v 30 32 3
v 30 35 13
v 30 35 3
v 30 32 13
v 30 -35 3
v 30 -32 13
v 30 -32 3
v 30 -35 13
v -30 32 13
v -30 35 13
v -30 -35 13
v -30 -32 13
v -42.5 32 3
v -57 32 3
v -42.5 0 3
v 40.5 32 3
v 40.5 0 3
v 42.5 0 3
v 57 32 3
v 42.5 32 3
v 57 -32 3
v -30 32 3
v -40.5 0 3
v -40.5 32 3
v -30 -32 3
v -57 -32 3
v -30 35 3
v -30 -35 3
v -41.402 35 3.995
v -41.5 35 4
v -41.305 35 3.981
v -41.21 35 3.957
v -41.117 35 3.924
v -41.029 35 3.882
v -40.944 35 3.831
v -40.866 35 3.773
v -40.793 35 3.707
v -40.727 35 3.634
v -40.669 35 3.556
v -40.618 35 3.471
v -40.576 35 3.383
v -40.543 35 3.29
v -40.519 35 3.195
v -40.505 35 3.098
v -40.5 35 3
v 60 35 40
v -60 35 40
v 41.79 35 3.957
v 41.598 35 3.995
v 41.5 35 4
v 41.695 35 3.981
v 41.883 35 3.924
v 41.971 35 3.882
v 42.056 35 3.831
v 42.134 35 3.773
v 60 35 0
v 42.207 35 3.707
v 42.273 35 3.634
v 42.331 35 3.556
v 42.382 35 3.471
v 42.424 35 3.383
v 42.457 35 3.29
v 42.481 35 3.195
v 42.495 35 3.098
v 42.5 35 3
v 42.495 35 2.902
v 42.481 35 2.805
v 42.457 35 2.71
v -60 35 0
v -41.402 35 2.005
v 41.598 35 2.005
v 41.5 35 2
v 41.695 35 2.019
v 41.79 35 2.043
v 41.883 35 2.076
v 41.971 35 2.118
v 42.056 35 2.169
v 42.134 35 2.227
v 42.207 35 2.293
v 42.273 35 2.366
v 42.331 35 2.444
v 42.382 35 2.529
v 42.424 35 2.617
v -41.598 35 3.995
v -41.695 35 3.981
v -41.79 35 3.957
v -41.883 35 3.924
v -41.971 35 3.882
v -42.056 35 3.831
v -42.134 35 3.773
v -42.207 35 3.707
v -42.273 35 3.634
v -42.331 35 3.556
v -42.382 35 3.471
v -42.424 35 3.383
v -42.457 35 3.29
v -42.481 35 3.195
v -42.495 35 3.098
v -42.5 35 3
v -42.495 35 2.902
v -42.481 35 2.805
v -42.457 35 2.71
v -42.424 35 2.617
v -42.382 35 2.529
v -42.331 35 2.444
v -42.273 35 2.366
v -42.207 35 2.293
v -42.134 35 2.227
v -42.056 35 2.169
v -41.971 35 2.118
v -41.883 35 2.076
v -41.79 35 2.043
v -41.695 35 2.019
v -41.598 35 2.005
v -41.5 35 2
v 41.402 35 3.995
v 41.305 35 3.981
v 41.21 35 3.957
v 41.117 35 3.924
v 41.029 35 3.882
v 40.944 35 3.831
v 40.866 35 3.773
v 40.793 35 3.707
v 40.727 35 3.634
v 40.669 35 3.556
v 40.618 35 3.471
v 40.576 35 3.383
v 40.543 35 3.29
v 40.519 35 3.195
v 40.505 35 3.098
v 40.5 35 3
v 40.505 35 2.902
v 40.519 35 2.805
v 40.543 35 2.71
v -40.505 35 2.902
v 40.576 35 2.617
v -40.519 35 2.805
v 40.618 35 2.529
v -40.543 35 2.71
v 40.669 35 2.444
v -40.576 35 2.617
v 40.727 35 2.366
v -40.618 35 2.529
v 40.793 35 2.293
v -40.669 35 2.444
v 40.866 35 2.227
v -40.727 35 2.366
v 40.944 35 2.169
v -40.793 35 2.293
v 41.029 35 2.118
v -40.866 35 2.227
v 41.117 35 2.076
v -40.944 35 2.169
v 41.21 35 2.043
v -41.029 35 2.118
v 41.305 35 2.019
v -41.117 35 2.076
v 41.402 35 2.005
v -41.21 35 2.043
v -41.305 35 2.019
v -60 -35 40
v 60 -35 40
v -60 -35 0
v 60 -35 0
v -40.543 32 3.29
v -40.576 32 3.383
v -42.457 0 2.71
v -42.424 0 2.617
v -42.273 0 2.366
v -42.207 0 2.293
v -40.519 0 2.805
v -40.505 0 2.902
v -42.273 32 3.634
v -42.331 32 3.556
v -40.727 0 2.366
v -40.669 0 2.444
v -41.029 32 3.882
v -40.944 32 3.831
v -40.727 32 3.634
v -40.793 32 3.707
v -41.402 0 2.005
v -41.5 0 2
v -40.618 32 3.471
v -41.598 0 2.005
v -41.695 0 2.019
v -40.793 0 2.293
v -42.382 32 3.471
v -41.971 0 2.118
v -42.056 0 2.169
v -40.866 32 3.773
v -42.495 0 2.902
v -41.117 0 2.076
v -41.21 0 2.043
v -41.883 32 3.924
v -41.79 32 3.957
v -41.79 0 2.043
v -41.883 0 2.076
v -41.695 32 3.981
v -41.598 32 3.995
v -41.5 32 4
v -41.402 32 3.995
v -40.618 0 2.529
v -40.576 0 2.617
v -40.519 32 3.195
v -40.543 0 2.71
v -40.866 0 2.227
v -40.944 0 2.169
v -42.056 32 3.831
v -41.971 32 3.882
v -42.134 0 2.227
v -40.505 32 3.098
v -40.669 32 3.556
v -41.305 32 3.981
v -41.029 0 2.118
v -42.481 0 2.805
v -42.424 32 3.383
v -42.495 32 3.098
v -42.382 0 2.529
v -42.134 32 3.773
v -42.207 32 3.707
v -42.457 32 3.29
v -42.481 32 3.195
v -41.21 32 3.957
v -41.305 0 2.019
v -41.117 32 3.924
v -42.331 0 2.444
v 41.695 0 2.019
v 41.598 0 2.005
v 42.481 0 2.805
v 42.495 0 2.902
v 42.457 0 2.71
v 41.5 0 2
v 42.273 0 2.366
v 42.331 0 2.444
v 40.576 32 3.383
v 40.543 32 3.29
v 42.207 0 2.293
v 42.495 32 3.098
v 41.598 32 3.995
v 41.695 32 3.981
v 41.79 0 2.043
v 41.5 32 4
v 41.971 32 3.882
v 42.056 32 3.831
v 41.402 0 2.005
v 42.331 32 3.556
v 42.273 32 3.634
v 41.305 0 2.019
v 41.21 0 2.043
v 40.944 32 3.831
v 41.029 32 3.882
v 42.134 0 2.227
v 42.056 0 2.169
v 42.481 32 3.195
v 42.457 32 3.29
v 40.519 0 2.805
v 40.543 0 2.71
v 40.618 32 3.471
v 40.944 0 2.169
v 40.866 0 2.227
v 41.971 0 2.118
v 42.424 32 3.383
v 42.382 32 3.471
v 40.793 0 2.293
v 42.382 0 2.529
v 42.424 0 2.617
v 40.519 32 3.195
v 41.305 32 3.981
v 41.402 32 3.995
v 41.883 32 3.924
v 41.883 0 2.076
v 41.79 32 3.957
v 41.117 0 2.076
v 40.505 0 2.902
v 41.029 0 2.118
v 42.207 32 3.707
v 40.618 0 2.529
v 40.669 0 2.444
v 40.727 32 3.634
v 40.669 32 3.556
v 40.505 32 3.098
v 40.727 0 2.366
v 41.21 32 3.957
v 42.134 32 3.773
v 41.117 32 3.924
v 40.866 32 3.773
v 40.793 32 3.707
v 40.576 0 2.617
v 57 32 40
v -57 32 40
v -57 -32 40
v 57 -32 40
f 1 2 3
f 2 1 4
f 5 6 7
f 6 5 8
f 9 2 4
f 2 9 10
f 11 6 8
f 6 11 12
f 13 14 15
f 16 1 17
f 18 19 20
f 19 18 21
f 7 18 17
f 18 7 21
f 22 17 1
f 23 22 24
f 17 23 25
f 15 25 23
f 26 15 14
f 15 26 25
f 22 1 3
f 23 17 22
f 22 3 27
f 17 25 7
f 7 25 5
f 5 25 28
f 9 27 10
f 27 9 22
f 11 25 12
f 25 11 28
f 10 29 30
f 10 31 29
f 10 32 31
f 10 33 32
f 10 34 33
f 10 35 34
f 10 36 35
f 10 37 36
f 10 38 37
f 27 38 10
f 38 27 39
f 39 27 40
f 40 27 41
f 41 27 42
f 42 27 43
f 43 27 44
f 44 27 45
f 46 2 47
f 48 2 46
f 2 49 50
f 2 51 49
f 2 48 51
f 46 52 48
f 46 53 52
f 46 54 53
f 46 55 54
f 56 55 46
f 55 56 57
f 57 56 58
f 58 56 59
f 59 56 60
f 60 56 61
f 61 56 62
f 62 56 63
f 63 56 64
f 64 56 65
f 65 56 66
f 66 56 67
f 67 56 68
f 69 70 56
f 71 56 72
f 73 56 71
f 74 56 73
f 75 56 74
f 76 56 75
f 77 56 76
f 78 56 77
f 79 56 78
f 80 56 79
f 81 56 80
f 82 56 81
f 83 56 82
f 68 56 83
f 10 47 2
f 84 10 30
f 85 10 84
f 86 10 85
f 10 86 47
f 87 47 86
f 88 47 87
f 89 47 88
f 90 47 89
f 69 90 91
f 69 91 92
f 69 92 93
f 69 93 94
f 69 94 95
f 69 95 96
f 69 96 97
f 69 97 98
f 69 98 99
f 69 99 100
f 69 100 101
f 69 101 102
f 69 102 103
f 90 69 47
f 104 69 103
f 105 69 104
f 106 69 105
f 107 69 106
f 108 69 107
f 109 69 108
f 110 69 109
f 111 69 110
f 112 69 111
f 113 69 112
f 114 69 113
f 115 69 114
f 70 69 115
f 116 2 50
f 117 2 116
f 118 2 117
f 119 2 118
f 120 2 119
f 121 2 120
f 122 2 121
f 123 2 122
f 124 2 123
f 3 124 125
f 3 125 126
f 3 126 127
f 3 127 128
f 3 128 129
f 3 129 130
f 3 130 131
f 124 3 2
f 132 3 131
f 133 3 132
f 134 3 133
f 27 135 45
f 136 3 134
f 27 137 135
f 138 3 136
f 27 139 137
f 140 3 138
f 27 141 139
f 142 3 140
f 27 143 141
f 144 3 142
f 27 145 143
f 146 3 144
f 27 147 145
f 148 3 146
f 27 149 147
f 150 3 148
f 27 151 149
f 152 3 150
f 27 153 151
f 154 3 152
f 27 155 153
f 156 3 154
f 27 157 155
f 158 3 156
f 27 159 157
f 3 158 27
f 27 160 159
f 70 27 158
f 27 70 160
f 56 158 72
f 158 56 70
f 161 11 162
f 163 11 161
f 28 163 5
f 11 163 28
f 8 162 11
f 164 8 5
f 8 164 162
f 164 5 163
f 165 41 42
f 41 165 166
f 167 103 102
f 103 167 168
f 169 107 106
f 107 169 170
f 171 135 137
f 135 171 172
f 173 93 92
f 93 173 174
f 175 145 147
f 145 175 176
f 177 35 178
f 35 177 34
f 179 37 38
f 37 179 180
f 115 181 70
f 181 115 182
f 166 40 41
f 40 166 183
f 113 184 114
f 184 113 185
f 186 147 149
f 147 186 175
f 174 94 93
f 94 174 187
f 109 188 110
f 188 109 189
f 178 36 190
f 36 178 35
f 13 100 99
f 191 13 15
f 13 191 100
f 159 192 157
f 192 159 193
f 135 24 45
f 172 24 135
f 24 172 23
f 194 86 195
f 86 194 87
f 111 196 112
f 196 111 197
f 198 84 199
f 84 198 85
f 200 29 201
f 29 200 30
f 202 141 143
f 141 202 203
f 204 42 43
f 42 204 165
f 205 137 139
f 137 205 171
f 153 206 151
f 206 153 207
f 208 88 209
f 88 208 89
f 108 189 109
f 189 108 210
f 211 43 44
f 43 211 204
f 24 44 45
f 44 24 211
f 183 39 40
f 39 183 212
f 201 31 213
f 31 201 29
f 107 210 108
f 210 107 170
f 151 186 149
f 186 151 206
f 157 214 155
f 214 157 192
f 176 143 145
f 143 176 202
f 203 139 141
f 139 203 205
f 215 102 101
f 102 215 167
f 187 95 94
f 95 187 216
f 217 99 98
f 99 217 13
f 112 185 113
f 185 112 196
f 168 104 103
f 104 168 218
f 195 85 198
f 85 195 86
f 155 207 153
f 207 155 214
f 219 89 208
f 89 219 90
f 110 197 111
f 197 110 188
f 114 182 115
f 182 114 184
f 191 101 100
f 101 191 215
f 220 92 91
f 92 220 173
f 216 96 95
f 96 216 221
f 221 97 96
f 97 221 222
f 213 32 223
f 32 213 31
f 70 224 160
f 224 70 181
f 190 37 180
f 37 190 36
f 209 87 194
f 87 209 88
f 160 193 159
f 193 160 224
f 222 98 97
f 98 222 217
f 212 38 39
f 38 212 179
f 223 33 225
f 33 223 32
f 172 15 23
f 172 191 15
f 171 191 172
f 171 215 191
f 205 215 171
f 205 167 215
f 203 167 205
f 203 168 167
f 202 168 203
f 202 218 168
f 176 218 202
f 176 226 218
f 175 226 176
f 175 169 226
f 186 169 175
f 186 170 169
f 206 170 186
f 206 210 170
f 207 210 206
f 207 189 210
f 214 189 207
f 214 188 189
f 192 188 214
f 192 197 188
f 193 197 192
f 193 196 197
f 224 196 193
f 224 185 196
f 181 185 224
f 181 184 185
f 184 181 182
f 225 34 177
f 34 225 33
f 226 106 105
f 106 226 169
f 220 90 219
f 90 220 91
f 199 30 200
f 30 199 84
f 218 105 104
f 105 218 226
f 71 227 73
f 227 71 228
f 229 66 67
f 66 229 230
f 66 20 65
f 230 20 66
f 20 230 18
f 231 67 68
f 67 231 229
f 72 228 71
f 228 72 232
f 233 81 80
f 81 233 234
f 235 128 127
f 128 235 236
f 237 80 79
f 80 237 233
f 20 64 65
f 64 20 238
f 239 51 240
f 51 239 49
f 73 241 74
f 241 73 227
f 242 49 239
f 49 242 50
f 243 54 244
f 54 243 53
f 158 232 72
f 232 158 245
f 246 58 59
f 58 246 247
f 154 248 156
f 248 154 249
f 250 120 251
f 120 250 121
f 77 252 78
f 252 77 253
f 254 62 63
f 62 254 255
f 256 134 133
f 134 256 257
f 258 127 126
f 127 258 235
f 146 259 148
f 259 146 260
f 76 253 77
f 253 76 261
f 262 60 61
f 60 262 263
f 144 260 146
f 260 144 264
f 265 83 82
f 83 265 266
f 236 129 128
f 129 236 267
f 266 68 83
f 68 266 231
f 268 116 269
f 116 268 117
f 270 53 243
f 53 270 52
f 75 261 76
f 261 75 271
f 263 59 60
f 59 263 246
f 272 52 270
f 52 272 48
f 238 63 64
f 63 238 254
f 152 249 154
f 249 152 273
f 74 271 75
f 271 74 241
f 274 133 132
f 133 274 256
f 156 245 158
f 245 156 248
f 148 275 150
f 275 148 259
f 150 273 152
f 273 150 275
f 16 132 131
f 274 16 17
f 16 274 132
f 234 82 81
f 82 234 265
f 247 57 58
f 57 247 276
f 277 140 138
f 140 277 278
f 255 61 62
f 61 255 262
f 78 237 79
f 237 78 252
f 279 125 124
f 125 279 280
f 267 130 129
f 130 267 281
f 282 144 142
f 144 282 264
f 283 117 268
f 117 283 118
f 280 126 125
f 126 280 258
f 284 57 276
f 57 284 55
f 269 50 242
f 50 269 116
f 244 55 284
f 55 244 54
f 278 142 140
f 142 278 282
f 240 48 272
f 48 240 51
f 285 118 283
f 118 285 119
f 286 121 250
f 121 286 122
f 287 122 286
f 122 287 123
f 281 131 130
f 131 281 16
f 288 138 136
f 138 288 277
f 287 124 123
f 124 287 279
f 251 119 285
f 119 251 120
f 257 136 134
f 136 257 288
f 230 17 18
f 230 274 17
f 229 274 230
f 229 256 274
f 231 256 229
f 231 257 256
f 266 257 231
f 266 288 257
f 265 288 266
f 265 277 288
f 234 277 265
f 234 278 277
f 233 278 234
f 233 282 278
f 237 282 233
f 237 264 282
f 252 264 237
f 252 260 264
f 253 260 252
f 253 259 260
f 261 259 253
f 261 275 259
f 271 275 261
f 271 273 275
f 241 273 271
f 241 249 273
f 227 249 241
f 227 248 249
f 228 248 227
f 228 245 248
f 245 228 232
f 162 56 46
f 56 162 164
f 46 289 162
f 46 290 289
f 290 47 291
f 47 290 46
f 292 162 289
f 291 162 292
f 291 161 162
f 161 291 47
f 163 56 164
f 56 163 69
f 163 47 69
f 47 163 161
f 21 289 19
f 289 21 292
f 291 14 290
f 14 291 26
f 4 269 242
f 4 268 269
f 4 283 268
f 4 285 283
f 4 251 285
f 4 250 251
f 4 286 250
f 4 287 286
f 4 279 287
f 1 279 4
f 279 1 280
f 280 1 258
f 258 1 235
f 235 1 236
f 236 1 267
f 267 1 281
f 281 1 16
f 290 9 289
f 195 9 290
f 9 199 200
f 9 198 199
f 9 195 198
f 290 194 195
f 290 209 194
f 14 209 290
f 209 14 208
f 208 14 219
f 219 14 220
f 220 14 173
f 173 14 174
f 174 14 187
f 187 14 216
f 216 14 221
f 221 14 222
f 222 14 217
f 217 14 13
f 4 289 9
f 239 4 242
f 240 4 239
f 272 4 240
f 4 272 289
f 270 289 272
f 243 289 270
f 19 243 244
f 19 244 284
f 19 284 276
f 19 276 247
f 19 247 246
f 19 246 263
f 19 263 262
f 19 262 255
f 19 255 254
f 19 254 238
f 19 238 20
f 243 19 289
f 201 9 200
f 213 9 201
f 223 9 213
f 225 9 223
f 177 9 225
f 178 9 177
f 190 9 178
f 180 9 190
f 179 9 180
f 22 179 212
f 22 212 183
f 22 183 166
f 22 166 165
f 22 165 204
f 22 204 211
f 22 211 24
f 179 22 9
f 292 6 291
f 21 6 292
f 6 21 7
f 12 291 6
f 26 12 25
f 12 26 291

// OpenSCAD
// Buffer tank for a mini horizontal gel-electrophoresis box
// Units: mm. Print orientation: open top up, tank rests on XY plane at z = 0.

$fn = 64;

// ---- Tank ----
outer_x     = 120;   // outer length along X
outer_y     = 70;    // outer width along Y
tank_h      = 40;    // overall height along Z
wall        = 3;     // wall thickness
floor_t     = 3;     // floor thickness

// ---- Gel-tray platform ----
plat_x      = 60;    // platform length in X (centred)
plat_top_z  = 13;    // platform top height above tank floor (z = 13)

// ---- Electrode holes ----
hole_d      = 2;     // electrode hole diameter
hole_y      = 0;     // electrode hole Y position
hole_w_z    = tank_h - floor_t; // hole length along Z (through wall and upper part)

// ---- Misc ----
eps         = 0.5;   // cutter overshoot past faces

// ---- Model ----
difference() {
    // Outer tank shell
    translate([-outer_x/2, -outer_y/2, 0])
        cube([outer_x, outer_y, tank_h]);

    // Inner cavity, leaving floor_t of floor
    translate([-(outer_x - 2*wall)/2, -(outer_y - 2*wall)/2, floor_t])
        cube([outer_x - 2*wall, outer_y - 2*wall, tank_h - floor_t]);

    // Raised platform on the inner floor
    union() {
        translate([-plat_x/2, -outer_y/2, floor_t])
            cube([plat_x, outer_y, plat_top_z - floor_t]);
        // small overlap into cavity so the platform does not float
        translate([-(plat_x/2 - eps), -(outer_y - 2*wall)/2, floor_t])
            cube([plat_x - 2*eps, outer_y - 2*wall, plat_top_z - floor_t]);
    }

    // Horizontal electrode holes through each end wall, along X
    for (side = [-1, 1])
        translate([side * (outer_x/2 - hole_w_z/2), hole_y, floor_t])
            rotate([-90, 0, 0])
                cylinder(d = hole_d, h = hole_w_z);
}
